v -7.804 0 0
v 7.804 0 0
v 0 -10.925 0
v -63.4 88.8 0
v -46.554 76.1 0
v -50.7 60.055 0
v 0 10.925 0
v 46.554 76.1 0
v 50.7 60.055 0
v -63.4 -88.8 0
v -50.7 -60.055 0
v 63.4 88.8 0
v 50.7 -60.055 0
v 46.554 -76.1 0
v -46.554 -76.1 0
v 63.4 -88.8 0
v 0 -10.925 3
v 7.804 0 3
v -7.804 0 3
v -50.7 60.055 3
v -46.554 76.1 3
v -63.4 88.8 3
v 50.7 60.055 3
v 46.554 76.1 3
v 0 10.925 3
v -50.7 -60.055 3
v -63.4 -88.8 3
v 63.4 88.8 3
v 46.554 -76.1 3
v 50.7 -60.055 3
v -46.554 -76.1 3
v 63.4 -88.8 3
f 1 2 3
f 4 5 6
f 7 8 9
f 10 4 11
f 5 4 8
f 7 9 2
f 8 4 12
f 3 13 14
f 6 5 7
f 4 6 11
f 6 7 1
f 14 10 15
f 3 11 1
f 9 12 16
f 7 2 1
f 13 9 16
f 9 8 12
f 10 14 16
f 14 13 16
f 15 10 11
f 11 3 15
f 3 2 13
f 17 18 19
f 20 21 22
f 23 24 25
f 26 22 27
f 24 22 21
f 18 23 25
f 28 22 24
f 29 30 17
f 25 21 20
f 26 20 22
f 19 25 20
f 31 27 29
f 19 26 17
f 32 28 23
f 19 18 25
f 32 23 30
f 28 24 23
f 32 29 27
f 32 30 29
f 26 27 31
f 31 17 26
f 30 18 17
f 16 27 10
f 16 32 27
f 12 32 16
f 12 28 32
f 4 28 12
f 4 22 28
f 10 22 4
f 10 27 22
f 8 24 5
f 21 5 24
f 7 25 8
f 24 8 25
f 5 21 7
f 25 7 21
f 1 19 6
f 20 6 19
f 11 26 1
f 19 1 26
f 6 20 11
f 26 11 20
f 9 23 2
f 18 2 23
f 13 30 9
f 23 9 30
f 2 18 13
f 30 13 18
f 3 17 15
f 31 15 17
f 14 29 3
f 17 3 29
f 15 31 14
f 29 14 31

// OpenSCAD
show = 0; // [0:back, 1:front]
pictureSizeUnits = 25.4; // [1:mm, 25.4:inches]
pictureHeightInUnits = 7;
pictureWidthInUnits = 5;
// millimeters
frameFrontThickness = 4;
// millimeters
frameWidth=12;
// millimeters
framePictureOverlap=5;
// millimeters
frameBackingThickness=3;
// millimeters
frameStandWidth=45;
// millimeters
frameStandThickness=6;
// millimeters
tolerance=0.1;
backPieceFillFraction=0.1;

module dummy() {}

pictureHeight = pictureHeightInUnits * pictureSizeUnits;
pictureWidth = pictureWidthInUnits * pictureSizeUnits;

module front() {
wOut = pictureWidth+2*frameWidth-2*framePictureOverlap;
hOut = pictureHeight+2*frameWidth-2*framePictureOverlap;
wIn = pictureWidth-2*framePictureOverlap;
hIn = pictureHeight-2*framePictureOverlap;
    frameStandAngle=acos(frameStandWidth/hOut);

    linear_extrude(height=frameFrontThickness)
    difference() {
        square([wOut,hOut], center=true);
        square([wIn,hIn], center=true);
    }
    linear_extrude(height=frameFrontThickness+frameBackingThickness)
    difference() {
        square([wOut,hOut], center=true);
        square([pictureWidth+4*tolerance,pictureHeight+4*tolerance], center=true);
    }
    intersection() {
        translate([-wOut/2,-hOut/2,0]) cube([wOut,hOut,frameFrontThickness+frameBackingThickness+frameStandWidth]);
        translate([0,-hOut/2,frameFrontThickness+frameBackingThickness])
        rotate(-[90-frameStandAngle,0,0])
        translate([-wOut/2,0,0])
        cube([wOut,frameStandThickness,frameStandWidth]);
    }
}

module back() {
    
    dim = min(pictureWidth,pictureHeight)*backPieceFillFraction;
    linear_extrude(height=frameBackingThickness) {
        difference() {
            square([pictureWidth-2*tolerance,pictureHeight-2*tolerance], center=true);
            square([pictureWidth-2*tolerance-2*dim,pictureHeight-2*tolerance-2*dim], center=true);
        }
        intersection() {
            square([pictureWidth-2*tolerance,pictureHeight-2*tolerance], center=true);
            union() {
                rotate(atan2(pictureHeight,pictureWidth)) square([2*pictureWidth,dim], center=true);
                rotate(-atan2(pictureHeight,pictureWidth)) square([2*pictureWidth,dim], center=true);
            }
    }
}
}

if (show==1) {
    render(convexity=2)
    front();
}
else {
    render(convexity=2)
    back();
}
